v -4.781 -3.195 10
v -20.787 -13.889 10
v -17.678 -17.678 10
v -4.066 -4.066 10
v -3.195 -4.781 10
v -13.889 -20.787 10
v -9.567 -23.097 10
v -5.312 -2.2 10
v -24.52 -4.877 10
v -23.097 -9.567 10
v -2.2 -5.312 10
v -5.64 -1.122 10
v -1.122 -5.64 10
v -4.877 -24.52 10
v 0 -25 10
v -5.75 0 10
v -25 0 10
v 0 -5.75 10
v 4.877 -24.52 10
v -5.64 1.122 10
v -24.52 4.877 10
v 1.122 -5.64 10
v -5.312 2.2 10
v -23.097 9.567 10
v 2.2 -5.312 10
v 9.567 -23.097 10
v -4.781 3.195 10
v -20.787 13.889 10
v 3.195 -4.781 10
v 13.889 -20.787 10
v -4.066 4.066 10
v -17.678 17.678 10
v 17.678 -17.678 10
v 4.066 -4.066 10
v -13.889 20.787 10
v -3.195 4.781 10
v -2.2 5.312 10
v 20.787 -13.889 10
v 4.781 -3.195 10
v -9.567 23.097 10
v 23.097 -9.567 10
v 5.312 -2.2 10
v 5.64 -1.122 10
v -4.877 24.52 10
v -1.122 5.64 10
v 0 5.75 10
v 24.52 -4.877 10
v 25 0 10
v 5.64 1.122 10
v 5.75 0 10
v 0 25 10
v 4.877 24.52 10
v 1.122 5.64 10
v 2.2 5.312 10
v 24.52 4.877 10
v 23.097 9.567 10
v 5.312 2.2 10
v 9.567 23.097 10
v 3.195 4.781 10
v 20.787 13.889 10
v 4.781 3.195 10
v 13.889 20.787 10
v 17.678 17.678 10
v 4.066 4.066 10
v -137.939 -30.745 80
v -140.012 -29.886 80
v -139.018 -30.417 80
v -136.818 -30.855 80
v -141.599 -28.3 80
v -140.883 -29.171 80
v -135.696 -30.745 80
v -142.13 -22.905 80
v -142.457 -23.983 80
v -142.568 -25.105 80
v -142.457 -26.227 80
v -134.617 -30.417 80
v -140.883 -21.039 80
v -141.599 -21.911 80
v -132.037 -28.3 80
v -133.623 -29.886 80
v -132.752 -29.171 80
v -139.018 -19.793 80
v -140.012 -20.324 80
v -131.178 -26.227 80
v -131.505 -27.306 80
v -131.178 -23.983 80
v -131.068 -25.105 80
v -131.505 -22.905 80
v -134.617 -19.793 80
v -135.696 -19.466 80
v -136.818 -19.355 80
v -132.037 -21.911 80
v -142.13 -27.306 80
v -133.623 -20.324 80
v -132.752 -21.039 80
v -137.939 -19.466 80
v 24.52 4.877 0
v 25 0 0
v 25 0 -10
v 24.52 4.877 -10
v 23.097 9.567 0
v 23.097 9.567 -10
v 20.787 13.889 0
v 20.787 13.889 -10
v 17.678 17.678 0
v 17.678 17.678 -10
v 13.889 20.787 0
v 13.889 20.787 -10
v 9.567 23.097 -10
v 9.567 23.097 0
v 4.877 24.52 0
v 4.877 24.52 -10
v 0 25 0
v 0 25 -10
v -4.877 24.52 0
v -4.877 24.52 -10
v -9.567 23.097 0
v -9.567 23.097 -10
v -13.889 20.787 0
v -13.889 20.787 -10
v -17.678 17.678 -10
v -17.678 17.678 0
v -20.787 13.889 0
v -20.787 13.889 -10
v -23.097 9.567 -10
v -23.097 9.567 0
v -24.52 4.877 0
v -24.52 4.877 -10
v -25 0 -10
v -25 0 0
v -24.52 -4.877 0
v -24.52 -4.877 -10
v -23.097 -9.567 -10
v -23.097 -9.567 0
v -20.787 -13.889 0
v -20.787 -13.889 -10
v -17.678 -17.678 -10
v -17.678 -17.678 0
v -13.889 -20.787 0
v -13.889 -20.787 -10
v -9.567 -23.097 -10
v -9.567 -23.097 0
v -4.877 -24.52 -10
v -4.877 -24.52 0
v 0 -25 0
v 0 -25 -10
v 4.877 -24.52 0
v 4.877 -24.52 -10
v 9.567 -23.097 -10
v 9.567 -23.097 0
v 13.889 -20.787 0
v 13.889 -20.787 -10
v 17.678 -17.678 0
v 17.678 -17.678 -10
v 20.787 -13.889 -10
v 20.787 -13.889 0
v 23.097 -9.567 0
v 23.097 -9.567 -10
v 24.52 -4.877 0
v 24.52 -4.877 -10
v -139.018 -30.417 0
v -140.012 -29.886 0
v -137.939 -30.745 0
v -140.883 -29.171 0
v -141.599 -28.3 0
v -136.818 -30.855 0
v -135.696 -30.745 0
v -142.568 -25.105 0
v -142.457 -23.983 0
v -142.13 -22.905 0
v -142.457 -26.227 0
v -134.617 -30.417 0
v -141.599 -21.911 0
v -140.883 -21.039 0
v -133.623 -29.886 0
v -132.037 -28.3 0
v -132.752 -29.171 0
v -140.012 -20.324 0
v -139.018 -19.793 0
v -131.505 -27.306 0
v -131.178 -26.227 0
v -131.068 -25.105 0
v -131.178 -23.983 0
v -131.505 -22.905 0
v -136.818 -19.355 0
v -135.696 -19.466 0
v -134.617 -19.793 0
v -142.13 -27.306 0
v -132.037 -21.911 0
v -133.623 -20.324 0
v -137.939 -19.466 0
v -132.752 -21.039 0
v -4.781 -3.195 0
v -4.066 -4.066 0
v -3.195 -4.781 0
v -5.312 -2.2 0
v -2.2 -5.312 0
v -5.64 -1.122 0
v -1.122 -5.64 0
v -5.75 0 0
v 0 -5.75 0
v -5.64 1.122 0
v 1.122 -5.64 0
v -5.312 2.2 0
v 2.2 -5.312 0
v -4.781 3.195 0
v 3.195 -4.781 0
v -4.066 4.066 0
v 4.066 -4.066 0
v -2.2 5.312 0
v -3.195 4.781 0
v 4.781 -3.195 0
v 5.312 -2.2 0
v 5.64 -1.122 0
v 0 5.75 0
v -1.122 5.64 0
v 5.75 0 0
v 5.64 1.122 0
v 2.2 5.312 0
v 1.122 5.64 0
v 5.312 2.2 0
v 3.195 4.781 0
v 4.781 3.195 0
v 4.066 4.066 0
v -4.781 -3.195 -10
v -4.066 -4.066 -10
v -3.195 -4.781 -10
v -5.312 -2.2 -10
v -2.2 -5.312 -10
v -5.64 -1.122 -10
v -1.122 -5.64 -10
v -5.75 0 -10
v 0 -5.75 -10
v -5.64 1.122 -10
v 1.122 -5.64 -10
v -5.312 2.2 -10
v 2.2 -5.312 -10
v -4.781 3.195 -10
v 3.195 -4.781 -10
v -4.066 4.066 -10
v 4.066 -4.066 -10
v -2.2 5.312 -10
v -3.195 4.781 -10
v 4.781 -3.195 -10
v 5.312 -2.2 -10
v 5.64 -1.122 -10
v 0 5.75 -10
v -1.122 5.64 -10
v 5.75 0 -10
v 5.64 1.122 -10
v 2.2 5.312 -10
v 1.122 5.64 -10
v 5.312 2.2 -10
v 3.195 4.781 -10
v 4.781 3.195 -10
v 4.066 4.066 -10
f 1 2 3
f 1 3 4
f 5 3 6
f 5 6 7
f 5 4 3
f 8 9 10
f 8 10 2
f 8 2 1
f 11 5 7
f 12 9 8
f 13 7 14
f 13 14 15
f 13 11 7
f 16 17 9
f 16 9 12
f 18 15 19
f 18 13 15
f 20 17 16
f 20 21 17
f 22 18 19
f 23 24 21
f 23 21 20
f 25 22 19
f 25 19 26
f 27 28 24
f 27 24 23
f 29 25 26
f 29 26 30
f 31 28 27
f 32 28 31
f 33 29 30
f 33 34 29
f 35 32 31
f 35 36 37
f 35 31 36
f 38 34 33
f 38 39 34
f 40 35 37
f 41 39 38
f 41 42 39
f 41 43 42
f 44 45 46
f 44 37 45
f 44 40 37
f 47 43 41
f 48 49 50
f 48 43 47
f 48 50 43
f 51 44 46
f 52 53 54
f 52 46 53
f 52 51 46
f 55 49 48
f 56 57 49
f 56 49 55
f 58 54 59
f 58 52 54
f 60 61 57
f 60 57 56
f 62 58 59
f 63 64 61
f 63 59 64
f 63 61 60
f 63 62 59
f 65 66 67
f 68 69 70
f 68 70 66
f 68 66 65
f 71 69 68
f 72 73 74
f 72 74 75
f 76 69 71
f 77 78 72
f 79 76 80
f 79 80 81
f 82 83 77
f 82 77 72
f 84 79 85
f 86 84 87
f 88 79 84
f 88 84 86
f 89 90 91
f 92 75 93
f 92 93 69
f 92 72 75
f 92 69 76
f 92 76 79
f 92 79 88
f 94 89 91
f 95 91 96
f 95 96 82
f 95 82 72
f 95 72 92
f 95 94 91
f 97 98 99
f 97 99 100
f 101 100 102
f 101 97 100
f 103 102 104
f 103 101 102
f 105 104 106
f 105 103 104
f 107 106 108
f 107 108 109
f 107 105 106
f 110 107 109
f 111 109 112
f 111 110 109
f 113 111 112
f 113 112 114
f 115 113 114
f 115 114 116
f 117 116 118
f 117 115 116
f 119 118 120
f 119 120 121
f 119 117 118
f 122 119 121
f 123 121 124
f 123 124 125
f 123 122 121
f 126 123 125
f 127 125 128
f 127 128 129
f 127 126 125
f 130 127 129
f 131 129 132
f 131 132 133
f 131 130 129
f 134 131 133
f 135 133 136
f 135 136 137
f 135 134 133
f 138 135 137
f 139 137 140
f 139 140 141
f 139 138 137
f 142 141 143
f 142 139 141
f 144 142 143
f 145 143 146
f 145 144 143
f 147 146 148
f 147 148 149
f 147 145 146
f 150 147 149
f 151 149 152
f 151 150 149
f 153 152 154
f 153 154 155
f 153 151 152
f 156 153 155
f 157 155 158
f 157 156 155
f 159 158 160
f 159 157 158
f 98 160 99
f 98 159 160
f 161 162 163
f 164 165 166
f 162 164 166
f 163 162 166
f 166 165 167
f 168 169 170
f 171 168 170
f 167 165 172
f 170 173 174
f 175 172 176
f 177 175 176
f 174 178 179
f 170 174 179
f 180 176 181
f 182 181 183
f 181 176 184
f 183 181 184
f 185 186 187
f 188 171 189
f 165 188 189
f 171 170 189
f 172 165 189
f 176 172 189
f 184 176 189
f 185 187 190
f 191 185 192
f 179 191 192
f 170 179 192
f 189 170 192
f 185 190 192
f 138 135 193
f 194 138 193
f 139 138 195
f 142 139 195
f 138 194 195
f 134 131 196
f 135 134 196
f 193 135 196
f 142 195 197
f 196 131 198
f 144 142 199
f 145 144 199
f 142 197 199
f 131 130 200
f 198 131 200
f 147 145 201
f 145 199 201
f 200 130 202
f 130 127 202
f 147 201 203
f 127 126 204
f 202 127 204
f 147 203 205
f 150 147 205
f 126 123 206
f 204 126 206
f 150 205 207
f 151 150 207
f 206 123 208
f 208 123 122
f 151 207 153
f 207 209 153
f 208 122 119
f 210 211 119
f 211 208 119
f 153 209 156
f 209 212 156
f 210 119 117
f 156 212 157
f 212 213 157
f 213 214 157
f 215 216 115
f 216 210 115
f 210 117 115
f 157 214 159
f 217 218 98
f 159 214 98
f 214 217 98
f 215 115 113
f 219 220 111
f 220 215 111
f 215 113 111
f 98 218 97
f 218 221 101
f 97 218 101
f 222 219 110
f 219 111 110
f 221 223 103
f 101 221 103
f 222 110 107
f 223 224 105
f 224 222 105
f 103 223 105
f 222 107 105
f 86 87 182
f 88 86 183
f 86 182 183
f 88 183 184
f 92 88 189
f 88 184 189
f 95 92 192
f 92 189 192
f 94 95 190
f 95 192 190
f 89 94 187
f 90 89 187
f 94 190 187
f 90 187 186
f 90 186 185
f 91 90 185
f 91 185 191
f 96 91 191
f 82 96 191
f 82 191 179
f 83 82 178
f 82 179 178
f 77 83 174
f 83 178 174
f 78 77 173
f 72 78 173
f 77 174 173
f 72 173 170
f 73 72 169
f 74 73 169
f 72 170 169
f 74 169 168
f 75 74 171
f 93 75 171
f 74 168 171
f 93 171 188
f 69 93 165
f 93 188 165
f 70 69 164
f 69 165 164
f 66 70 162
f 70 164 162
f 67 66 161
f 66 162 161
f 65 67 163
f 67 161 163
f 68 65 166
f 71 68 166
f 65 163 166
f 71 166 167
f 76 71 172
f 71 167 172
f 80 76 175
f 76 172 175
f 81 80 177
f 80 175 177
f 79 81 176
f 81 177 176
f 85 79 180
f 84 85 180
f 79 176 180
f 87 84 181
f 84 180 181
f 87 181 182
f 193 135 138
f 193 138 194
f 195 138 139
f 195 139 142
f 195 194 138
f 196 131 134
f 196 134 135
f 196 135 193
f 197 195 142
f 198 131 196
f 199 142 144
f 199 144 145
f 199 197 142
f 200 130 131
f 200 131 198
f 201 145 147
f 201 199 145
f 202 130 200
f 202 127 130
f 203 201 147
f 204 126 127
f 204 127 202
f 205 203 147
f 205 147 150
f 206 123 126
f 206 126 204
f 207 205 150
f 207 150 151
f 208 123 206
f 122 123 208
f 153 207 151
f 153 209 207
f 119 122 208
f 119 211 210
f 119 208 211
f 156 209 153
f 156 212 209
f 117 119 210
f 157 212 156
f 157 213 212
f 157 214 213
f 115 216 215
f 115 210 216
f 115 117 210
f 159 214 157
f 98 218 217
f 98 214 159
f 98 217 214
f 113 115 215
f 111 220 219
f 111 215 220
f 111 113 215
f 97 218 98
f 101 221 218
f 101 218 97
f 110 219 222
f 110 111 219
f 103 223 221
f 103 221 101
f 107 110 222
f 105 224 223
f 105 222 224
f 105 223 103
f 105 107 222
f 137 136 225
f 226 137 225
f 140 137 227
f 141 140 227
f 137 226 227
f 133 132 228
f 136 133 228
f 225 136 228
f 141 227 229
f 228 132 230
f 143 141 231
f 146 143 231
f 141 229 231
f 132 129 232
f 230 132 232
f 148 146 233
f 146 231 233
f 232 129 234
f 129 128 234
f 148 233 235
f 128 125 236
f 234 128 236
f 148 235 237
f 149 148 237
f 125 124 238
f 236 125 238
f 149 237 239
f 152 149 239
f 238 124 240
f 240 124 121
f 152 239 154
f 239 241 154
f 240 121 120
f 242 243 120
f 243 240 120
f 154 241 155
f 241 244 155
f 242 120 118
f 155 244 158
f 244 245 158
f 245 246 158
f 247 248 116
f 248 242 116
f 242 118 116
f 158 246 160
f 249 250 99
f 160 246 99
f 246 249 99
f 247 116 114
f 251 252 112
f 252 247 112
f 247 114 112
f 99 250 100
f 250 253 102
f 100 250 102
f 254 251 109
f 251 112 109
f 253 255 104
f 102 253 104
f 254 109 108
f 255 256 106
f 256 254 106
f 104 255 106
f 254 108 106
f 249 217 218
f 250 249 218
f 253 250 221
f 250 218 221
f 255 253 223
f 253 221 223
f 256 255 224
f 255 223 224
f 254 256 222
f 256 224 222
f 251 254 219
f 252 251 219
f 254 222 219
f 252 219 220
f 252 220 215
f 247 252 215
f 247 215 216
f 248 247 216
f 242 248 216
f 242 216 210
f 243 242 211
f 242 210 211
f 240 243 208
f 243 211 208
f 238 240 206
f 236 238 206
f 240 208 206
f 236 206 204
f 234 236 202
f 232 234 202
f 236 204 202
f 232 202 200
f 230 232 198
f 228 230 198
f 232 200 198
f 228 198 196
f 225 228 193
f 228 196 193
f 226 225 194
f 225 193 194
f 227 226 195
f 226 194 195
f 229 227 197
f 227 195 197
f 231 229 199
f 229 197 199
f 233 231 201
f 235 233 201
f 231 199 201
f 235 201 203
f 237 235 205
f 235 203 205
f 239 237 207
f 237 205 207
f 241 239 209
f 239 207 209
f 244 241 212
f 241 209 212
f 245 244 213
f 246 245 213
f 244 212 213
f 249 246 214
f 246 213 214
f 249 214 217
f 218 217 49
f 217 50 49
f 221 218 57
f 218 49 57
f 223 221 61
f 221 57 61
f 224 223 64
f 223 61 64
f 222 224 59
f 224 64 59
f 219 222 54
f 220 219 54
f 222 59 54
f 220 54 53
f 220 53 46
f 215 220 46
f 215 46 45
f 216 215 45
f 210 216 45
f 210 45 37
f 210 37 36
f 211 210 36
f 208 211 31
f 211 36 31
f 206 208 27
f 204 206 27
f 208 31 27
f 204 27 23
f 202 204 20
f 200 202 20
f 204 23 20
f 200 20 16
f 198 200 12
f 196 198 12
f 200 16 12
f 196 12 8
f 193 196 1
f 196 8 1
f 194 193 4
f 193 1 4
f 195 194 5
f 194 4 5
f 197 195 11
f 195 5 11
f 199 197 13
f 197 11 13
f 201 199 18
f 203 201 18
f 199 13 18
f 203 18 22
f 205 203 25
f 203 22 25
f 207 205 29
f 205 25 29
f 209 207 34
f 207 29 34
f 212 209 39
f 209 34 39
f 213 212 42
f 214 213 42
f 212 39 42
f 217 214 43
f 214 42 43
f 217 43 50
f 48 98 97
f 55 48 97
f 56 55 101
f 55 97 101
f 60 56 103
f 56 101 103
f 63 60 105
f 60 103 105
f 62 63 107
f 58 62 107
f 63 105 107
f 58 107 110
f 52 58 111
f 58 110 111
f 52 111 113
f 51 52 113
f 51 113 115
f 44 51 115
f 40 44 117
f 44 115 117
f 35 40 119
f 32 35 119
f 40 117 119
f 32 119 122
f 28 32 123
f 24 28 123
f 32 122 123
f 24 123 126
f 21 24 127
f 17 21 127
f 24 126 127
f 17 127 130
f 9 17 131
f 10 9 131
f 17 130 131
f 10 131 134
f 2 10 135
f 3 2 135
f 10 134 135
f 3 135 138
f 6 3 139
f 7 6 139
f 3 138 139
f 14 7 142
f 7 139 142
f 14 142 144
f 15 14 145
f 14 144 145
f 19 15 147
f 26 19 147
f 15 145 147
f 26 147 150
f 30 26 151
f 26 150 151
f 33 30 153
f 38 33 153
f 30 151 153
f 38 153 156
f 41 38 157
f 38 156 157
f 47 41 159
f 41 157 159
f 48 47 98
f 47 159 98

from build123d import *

# Parameters (mm, degrees)
F0_R          = 25
F1_DEPTH      = 10
F2_DEPTH      = 10
F3_R          = 5.75
F4_DEPTH      = 10
F4_DEPTH_BACK = 10
F5_R          = 5.75
F6_DEPTH      = 80


with BuildPart() as f1:
    # F0 (on Top) → F1 (new body)
    with BuildSketch(Plane.XY):
        Circle(F0_R)
    extrude(amount=F1_DEPTH)


with BuildPart() as f2:
    # F0 (on Top) → F2 (new body)
    with BuildSketch(Plane.XY):
        Circle(F0_R)
    extrude(amount=-F2_DEPTH)


with BuildPart() as f4_tool:
    # F3 (on Top) → F4 (new body, two sides)
    with BuildSketch(Plane.XY) as f4_sk:
        Circle(F3_R)
    extrude(amount=F4_DEPTH)
    extrude(f4_sk.sketch, amount=-F4_DEPTH_BACK)


with BuildPart() as f1_1:
    add(f1.part)

    # F4: cut by f4_tool
    add(f4_tool.part, mode=Mode.SUBTRACT)


with BuildPart() as f2_1:
    add(f2.part)

    # F4: cut by f4_tool
    add(f4_tool.part, mode=Mode.SUBTRACT)


with BuildPart() as f6:
    # F5 (on Top) → F6 (new body)
    with BuildSketch(Plane.XY):
        with Locations((-136.817604, -25.10508)):
            Circle(F5_R)
    extrude(amount=F6_DEPTH)


solid = Compound([f1_1.part, f2_1.part, f6.part])
